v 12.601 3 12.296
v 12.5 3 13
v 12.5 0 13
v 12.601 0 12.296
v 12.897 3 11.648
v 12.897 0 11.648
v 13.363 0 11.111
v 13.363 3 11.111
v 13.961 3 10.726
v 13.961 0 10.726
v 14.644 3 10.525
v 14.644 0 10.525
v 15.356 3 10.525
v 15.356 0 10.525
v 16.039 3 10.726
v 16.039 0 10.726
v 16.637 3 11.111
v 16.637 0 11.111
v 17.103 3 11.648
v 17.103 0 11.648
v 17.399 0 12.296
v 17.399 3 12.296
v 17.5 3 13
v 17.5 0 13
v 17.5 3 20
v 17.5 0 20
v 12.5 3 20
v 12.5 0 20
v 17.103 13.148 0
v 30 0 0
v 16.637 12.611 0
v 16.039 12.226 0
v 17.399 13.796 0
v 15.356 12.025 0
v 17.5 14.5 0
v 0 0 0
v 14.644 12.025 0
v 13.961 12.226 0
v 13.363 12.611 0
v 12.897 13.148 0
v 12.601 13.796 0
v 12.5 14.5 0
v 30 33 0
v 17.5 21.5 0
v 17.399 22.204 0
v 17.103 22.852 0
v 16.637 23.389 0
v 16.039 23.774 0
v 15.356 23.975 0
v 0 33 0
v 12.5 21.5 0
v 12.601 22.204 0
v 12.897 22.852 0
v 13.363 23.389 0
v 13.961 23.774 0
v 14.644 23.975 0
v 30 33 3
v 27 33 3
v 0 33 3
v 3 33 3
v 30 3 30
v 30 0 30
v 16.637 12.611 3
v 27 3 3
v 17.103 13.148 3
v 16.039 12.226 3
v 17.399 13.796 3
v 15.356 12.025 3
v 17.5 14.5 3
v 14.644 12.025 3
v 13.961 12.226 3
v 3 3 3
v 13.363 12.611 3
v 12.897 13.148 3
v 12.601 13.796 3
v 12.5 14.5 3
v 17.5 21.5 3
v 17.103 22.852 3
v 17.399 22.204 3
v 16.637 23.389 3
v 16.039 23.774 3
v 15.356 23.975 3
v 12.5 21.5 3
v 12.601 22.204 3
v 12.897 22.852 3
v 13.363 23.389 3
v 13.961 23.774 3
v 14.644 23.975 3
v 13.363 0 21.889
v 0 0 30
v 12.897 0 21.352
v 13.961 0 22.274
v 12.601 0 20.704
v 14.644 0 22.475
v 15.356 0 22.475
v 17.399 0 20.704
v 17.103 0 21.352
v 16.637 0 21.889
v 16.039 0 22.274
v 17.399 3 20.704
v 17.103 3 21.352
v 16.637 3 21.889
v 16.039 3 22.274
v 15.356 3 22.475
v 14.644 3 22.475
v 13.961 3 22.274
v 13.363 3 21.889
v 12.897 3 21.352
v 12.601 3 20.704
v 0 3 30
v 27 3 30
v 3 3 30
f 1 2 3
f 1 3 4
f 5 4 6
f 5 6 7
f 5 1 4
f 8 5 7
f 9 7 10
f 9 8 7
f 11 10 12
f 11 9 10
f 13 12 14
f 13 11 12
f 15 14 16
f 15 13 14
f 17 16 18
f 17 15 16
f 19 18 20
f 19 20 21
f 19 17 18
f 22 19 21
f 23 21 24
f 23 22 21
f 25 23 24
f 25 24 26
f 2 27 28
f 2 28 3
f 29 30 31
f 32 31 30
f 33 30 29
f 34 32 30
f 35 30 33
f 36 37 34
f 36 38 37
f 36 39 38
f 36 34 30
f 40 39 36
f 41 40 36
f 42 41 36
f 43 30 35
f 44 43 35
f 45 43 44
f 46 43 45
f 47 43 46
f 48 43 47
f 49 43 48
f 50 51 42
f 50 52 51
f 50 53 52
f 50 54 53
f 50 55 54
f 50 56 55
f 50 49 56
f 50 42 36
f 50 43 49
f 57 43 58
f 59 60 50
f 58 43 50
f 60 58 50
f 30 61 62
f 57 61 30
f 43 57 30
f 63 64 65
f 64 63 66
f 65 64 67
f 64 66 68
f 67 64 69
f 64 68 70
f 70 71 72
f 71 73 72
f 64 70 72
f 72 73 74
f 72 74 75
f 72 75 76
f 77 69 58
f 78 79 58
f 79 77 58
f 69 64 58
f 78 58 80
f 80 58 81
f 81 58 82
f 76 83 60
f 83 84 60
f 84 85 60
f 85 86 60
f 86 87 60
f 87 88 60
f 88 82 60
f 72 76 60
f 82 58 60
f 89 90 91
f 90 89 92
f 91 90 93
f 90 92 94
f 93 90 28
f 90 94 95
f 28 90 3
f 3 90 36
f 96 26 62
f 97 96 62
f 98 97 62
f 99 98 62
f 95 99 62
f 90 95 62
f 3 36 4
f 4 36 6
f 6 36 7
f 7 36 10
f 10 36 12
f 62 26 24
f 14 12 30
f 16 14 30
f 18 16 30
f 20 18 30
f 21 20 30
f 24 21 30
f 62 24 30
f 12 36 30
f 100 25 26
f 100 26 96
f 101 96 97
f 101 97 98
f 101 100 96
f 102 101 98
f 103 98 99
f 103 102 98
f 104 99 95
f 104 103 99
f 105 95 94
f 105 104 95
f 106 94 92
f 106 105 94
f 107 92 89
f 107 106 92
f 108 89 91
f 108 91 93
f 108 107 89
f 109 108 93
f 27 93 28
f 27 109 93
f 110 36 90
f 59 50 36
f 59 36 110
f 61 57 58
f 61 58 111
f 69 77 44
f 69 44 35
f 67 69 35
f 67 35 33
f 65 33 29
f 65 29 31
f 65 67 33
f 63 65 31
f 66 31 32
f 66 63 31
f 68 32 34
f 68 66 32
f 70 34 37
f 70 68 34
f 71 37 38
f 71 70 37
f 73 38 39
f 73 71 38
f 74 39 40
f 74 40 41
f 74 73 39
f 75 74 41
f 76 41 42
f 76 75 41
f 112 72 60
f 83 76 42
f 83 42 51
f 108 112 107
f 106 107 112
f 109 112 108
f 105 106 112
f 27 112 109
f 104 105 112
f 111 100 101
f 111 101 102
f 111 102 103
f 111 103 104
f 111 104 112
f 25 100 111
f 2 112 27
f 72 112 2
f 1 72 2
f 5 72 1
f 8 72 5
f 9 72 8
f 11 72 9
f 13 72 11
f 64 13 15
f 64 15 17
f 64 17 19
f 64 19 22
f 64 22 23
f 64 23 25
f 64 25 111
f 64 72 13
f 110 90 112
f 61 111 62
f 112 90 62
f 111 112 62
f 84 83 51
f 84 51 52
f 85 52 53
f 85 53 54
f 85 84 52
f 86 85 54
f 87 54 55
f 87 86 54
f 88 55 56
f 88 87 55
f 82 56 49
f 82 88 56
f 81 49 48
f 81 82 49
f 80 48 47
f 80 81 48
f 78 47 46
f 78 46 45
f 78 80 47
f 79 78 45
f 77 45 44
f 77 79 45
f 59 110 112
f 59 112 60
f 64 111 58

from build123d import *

# Parameters (mm, degrees)
SKETCH1_W           = 30
SKETCH1_H           = 30
BOSS_EXTRUDE1_DEPTH = 3
SKETCH2_W           = 30
SKETCH2_H           = 30
BOSS_EXTRUDE2_DEPTH = 3
BOSS_EXTRUDE3_DEPTH = 3
BOSS_EXTRUDE4_DEPTH = 3
CUT_EXTRUDE1_DEPTH  = 3
CUT_EXTRUDE2_DEPTH  = 3


with BuildPart() as part:
    # Sketch1 → Boss-Extrude1 (new body)
    with BuildSketch(Plane(origin=(0, 0, 0), x_dir=(1, 0, 0), z_dir=(0, 1, 0))):
        with Locations((15, -15)):
            Rectangle(SKETCH1_W, SKETCH1_H)
    extrude(amount=BOSS_EXTRUDE1_DEPTH)

    # Sketch2 → Boss-Extrude2 (add)
    with BuildSketch(Plane(origin=(0, 0, 0), x_dir=(-1, 0, 0), z_dir=(0, 0, -1))):
        with Locations((-15, 18)):
            Rectangle(SKETCH2_W, SKETCH2_H)
    extrude(amount=-BOSS_EXTRUDE2_DEPTH)

    # Sketch3 → Boss-Extrude3 (add)
    with BuildSketch(Plane.ZY):
        Polygon((3, 33), (3, 3), (30, 3), align=None)
    extrude(amount=-BOSS_EXTRUDE3_DEPTH)

    # Sketch4 → Boss-Extrude4 (add)
    with BuildSketch(Plane(origin=(30, 0, 0), x_dir=(0, 0, -1), z_dir=(1, 0, 0))):
        Polygon((-30, 3), (-3, 3), (-3, 33), align=None)
    extrude(amount=-BOSS_EXTRUDE4_DEPTH)

    # Sketch5 → Cut-Extrude1 (cut)
    with BuildSketch(Plane.XY.offset(3)):
        with BuildLine():
            Line((12.5, 14.5), (12.5, 21.5))
            ThreePointArc((12.5, 21.5), (15, 24), (17.5, 21.5))
            Line((17.5, 21.5), (17.5, 14.5))
            ThreePointArc((17.5, 14.5), (15, 12), (12.5, 14.5))
        make_face()
    extrude(amount=-CUT_EXTRUDE1_DEPTH, mode=Mode.SUBTRACT)

    # Sketch6 → Cut-Extrude2 (cut)
    with BuildSketch(Plane(origin=(0, 3, 0), x_dir=(1, 0, 0), z_dir=(0, 1, 0))):
        with BuildLine():
            Line((12.5, -20), (12.5, -13))
            ThreePointArc((12.5, -13), (15, -10.5), (17.5, -13))
            Line((17.5, -13), (17.5, -20))
            ThreePointArc((17.5, -20), (15, -22.5), (12.5, -20))
        make_face()
    extrude(amount=-CUT_EXTRUDE2_DEPTH, mode=Mode.SUBTRACT)


solid = part.part
